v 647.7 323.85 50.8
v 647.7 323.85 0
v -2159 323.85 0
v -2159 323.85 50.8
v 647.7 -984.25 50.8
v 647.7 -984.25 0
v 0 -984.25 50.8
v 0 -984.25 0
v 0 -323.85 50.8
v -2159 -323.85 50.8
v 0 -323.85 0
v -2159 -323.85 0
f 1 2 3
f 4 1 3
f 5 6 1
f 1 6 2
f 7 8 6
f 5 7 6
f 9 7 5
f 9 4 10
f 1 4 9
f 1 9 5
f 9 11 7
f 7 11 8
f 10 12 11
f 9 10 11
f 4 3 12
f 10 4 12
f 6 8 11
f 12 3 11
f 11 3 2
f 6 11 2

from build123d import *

# Parameters (mm, degrees)
F1_DEPTH = 50.8


with BuildPart() as f1:
    # F0 (on Top) → F1 (new body)
    with BuildSketch(Plane.XY):
        Polygon((-2159, -323.85), (0, -323.85), (0, 0), (0, 323.85), (-2159, 323.85), align=None)
        Polygon((0, 0), (0, -323.85), (0, -984.25), (647.7, -984.25), (647.7, 323.85), (0, 323.85), align=None)
    extrude(amount=F1_DEPTH)


solid = f1.part
